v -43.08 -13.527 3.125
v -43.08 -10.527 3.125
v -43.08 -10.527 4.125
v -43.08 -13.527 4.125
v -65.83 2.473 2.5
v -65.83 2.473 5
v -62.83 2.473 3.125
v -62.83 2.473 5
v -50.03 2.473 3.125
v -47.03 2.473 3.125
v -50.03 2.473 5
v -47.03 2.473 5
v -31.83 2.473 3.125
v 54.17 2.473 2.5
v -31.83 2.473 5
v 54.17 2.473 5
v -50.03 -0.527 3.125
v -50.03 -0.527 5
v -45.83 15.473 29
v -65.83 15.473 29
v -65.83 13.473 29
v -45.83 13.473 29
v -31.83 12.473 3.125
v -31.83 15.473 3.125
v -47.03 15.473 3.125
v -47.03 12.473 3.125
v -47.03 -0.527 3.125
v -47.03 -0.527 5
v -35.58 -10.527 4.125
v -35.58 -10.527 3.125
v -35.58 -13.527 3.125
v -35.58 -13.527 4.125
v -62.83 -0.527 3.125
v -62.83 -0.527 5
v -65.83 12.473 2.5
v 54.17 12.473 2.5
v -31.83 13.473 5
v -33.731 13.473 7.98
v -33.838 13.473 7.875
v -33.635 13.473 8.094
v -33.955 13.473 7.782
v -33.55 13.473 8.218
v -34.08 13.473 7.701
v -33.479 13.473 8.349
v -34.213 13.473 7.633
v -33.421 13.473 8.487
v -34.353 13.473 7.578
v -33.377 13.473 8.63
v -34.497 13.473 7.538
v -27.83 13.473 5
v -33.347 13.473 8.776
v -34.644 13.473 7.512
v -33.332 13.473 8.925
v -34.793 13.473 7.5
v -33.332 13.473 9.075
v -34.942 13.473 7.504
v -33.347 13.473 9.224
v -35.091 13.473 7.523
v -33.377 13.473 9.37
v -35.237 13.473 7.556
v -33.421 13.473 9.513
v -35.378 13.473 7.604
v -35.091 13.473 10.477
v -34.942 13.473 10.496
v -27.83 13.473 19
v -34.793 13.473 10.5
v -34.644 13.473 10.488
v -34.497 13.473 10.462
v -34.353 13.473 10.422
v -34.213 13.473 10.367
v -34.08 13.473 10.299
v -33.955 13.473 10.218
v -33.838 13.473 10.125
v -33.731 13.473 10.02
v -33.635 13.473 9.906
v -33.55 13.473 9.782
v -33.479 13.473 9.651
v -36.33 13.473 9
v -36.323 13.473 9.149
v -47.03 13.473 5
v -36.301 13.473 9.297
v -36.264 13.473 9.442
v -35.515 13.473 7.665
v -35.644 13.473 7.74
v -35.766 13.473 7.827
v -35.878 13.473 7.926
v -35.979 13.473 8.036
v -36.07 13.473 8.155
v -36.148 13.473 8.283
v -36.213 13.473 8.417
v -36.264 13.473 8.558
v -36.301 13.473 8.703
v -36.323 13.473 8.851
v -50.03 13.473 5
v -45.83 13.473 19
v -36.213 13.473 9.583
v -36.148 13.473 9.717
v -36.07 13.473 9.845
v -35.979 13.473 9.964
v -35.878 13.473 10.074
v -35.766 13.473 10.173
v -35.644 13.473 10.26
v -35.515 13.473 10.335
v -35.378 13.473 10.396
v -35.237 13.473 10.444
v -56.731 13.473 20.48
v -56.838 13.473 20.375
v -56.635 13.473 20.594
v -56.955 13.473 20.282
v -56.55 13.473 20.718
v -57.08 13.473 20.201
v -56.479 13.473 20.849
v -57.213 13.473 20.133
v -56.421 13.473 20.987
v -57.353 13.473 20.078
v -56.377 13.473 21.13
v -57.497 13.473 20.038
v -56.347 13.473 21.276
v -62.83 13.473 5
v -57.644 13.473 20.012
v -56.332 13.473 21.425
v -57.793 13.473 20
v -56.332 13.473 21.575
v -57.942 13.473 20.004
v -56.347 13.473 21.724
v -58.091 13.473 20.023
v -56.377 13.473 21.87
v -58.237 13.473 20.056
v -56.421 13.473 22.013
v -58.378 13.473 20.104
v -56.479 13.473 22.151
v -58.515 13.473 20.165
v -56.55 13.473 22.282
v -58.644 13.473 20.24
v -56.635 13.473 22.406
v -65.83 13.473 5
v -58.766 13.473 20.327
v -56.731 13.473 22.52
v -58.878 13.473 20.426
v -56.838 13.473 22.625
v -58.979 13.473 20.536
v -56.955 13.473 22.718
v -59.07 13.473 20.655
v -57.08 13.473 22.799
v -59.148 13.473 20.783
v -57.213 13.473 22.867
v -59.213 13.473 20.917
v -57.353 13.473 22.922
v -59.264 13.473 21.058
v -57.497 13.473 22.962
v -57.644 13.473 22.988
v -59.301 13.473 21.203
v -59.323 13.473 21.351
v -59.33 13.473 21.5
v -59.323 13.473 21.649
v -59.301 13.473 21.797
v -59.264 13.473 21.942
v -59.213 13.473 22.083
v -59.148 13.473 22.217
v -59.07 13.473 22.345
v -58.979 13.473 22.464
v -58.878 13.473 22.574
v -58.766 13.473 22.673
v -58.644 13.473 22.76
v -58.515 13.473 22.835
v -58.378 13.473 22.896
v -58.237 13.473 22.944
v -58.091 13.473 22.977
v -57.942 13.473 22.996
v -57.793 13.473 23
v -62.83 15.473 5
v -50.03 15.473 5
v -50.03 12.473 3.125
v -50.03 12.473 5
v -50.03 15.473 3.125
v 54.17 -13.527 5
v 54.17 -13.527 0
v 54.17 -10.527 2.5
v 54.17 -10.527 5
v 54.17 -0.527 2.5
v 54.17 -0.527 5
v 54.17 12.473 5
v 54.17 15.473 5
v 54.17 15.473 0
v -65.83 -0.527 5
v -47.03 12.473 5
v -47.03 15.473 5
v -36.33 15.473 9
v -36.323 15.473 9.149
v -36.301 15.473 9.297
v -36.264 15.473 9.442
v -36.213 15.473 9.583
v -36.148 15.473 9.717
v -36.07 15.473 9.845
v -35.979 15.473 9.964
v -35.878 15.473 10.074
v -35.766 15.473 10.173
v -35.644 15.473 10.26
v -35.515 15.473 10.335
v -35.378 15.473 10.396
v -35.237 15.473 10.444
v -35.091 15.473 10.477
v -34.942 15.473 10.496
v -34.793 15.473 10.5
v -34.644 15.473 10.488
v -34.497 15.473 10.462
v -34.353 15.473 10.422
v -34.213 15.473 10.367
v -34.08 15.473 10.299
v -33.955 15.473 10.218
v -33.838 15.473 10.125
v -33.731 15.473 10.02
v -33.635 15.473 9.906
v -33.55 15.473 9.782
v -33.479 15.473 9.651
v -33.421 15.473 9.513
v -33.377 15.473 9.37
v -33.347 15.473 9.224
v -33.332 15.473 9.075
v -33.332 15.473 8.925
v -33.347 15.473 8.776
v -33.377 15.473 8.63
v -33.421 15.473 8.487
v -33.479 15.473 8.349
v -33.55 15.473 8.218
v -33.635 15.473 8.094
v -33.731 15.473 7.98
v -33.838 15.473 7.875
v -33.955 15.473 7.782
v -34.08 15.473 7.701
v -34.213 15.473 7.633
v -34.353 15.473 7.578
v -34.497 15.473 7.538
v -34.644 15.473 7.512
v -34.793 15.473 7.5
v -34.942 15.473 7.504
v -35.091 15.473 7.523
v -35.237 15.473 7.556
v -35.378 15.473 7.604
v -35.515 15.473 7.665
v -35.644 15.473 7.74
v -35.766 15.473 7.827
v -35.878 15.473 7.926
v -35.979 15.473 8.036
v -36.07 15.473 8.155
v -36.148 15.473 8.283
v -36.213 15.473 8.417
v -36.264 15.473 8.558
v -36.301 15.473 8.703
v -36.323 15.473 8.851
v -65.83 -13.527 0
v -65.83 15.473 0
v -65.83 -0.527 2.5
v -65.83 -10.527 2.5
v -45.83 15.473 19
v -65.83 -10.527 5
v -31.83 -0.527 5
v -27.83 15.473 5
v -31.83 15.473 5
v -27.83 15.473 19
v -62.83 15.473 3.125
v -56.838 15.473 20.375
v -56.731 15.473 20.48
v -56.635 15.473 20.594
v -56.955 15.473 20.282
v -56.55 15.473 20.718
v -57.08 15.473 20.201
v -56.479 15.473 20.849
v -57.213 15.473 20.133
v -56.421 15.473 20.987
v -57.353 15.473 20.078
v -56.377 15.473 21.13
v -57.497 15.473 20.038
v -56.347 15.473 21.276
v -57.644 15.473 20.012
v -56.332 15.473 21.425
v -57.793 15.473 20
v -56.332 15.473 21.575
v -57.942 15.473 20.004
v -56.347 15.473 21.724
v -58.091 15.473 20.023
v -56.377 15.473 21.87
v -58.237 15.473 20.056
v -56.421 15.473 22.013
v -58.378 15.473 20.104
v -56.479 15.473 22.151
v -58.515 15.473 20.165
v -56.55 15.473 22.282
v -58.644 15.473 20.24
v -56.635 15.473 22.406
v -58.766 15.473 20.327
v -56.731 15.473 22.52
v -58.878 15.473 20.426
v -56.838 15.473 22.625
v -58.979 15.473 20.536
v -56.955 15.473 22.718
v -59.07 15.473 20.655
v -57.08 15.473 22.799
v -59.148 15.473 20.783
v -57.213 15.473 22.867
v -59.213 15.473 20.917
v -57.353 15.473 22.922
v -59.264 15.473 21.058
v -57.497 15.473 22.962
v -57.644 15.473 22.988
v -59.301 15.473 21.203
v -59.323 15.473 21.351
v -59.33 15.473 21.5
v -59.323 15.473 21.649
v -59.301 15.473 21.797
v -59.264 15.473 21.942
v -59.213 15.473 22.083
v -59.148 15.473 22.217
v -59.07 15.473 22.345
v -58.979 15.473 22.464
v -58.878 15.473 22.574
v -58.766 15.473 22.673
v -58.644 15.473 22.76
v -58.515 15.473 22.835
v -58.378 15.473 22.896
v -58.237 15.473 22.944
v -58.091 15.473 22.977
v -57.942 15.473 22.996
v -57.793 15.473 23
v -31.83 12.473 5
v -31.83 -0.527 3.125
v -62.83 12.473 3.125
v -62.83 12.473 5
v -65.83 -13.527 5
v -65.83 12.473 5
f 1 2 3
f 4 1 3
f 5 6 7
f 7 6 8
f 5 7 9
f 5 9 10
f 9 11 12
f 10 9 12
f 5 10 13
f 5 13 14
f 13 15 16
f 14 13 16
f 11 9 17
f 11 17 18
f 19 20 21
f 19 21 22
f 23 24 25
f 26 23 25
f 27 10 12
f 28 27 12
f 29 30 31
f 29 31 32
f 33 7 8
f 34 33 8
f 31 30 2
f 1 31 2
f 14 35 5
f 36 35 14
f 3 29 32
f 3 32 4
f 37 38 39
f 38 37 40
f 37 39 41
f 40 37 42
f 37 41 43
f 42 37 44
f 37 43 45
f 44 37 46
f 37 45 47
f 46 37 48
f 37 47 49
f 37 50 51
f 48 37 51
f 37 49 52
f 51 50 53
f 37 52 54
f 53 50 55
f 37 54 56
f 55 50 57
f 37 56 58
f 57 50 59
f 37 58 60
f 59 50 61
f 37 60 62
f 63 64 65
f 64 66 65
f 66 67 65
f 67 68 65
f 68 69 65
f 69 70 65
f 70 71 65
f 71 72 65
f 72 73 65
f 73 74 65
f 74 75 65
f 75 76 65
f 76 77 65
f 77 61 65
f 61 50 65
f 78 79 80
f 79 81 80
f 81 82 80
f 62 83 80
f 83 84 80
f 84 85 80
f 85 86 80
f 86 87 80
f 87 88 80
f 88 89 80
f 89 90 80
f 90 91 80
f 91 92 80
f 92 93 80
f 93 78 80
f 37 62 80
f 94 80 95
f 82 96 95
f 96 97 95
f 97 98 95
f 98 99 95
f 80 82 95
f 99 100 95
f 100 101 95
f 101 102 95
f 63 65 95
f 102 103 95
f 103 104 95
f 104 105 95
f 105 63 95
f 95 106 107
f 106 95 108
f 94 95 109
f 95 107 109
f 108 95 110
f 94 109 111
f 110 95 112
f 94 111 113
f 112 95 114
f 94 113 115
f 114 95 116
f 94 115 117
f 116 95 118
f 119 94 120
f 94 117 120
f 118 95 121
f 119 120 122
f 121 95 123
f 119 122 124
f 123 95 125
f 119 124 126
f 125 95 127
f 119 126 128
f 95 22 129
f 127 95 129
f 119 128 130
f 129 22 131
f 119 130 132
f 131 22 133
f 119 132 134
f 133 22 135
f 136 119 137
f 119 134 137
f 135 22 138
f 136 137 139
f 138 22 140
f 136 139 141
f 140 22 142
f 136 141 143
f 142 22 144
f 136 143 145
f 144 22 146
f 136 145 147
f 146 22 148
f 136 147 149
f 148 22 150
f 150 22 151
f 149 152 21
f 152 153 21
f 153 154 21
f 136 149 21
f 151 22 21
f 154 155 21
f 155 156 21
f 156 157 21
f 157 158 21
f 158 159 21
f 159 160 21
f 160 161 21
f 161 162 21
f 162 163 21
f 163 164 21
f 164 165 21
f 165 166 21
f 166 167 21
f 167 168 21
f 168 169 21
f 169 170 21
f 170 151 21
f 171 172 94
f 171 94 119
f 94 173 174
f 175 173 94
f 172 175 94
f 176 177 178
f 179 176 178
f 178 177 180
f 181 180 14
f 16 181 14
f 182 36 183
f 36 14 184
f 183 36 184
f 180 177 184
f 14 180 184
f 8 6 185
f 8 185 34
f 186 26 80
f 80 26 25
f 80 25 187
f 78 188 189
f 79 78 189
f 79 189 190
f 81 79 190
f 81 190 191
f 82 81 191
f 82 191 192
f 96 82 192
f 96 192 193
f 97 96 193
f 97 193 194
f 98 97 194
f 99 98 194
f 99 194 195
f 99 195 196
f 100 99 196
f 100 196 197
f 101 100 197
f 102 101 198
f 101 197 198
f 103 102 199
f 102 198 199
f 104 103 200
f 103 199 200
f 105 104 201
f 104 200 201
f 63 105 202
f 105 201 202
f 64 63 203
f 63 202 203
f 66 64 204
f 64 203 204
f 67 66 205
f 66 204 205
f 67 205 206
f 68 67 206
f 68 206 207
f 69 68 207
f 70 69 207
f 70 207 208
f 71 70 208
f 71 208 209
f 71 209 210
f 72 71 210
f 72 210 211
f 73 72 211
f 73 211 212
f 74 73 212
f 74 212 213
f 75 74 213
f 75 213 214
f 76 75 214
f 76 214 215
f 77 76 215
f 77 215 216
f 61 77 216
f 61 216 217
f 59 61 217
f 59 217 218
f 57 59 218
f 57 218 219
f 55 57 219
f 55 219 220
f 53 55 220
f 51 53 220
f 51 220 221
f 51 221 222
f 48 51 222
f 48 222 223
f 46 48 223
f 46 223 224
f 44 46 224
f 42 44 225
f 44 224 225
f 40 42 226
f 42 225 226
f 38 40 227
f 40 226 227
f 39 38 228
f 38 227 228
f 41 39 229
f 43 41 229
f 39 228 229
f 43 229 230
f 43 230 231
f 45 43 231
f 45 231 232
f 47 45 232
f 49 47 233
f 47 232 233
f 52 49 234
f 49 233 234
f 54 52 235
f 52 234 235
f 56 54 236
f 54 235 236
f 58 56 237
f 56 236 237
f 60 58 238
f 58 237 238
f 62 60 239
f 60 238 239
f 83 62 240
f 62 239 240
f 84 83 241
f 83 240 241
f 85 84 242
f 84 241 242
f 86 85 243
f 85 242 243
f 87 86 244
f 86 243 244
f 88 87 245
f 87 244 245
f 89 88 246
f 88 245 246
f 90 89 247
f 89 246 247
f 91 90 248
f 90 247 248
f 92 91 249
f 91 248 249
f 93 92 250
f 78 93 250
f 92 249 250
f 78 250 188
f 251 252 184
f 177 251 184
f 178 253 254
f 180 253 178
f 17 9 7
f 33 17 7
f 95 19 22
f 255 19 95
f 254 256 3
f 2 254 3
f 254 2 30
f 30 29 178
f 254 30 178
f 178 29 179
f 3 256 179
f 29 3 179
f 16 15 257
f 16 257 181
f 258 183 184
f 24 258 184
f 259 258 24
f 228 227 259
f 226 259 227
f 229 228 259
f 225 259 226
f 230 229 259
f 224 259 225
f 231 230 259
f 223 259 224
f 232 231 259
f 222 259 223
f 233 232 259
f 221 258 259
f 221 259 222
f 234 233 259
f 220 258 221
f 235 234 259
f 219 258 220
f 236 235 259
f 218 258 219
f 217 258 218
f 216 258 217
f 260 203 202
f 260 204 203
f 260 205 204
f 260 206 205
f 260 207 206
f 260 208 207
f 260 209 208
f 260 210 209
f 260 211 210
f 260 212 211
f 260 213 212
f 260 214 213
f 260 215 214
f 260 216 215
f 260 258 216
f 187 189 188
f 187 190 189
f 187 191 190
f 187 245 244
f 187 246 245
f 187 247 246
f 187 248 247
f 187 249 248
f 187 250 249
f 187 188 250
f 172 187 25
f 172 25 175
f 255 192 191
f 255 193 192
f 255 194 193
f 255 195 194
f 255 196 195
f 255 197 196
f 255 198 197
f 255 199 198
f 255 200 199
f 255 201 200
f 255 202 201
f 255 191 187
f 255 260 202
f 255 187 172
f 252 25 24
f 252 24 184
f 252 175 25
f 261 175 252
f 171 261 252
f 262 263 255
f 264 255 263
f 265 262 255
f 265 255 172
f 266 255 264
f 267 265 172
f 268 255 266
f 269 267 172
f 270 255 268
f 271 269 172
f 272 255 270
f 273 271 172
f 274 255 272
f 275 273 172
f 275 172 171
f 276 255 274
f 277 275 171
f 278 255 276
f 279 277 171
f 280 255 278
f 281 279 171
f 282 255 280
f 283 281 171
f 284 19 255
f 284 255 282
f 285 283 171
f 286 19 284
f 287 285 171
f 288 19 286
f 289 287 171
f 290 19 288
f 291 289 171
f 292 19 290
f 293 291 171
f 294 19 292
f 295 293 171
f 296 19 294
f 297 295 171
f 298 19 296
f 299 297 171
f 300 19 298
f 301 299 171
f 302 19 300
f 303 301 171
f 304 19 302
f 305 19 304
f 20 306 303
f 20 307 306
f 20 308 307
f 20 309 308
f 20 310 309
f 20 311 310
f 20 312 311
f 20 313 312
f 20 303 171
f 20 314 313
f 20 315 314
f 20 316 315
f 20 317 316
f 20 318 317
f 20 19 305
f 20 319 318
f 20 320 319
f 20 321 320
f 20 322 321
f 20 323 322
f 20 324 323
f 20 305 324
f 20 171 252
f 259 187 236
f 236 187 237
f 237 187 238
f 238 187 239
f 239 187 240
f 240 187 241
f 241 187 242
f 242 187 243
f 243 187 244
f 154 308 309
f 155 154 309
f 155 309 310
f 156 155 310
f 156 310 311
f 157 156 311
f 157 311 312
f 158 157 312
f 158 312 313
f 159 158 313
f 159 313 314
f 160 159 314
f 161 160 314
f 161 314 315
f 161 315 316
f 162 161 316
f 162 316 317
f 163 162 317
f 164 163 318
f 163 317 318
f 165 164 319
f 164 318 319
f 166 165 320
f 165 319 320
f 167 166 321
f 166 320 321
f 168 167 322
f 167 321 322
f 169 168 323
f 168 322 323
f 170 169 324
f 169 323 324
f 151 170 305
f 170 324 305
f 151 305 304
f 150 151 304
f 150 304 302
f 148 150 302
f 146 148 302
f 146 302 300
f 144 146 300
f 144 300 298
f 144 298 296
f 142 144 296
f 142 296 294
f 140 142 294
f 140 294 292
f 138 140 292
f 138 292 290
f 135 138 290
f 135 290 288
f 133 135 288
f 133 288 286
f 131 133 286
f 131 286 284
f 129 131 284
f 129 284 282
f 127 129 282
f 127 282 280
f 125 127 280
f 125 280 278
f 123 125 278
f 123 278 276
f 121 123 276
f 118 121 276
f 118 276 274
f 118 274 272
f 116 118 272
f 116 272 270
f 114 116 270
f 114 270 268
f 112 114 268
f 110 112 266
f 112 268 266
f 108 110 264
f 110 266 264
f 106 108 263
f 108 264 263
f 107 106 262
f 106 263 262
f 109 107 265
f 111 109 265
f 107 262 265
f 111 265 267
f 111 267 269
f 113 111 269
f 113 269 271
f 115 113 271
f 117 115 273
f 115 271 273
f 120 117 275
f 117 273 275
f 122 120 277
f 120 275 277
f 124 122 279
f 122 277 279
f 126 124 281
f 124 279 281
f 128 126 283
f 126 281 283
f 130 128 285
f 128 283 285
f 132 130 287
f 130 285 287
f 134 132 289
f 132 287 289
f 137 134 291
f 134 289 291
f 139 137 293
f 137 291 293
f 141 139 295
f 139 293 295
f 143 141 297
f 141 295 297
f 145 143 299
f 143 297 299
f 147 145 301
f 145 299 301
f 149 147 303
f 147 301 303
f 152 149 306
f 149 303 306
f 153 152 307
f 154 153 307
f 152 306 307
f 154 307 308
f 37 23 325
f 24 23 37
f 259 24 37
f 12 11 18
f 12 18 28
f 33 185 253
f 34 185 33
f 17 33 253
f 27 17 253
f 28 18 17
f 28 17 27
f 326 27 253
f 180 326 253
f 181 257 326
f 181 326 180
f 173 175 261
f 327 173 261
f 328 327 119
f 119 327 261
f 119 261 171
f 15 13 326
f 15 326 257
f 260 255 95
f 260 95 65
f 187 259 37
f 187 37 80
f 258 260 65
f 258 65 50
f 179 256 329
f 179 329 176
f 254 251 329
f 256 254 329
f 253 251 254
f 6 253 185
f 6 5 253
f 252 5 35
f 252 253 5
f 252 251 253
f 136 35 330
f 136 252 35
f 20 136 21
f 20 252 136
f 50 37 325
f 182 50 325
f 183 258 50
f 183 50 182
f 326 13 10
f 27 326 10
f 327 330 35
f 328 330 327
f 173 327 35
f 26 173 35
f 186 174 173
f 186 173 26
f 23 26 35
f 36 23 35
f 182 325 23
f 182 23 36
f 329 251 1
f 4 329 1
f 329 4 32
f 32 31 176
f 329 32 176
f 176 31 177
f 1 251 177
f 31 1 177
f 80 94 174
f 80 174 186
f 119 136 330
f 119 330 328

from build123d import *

# Parameters (mm, degrees)
F0_W      = 120
F0_H      = 29
F1_DEPTH  = 5
F2_W      = 120
F2_H      = 10
F3_DEPTH  = 2.5
F5_DEPTH  = 2
F6_R      = 1.5
F7_DEPTH  = 25
F8_W      = 15.2
F8_H      = 1.875
F8_W_2    = 12.8
F9_DEPTH  = 18
F10_W     = 7.5
F10_H     = 1
F11_DEPTH = 3.001


with BuildPart() as f1:
    # F0 (on Top) → F1 (new body)
    with BuildSketch(Plane.XY):
        with Locations((-5.830355, 0.973214)):
            Rectangle(F0_W, F0_H)
    extrude(amount=F1_DEPTH)

    # F2 (on face) → F3 (cut)
    with BuildSketch(Plane.XY.offset(5)):
        with Locations((-5.830355, 7.473214)):
            Rectangle(F2_W, F2_H)
        with Locations((-5.830355, -5.526786)):
            Rectangle(F2_W, F2_H)
    extrude(amount=-F3_DEPTH, mode=Mode.SUBTRACT)

    # F4 (on face) → F5 (join)
    with BuildSketch(Plane(origin=(0, 15.473214, 0), x_dir=(-1, 0, 0), z_dir=(0, 1, 0))):
        Polygon((45.830355, 5), (65.830355, 5), (65.830355, 29), (45.830355, 29), (45.830355, 19), (27.830355, 19), (27.830355, 5), align=None)
    extrude(amount=-F5_DEPTH)

    # F6 (on face) → F7 (cut)
    with BuildSketch(Plane(origin=(0, 15.473214, 0), x_dir=(-1, 0, 0), z_dir=(0, 1, 0))):
        with Locations((57.830355, 21.5)):
            Circle(F6_R)
        with Locations((34.830355, 9)):
            Circle(F6_R)
    extrude(amount=-F7_DEPTH, mode=Mode.SUBTRACT)

    # F8 (on face) → F9 (cut)
    with BuildSketch(Plane(origin=(0, 15.473214, 0), x_dir=(-1, 0, 0), z_dir=(0, 1, 0))):
        with Locations((39.430355, 4.0625)):
            Rectangle(F8_W, F8_H)
        with Locations((56.430355, 4.0625)):
            Rectangle(F8_W_2, F8_H)
    extrude(amount=-F9_DEPTH, mode=Mode.SUBTRACT)

    # F10 (on face) → F11 (cut, through all)
    with BuildSketch(Plane(origin=(0, -10.526786, 0), x_dir=(-1, 0, 0), z_dir=(0, 1, 0))):
        with Locations((39.330355, 3.625)):
            Rectangle(F10_W, F10_H)
    extrude(amount=-F11_DEPTH, mode=Mode.SUBTRACT)


solid = f1.part
